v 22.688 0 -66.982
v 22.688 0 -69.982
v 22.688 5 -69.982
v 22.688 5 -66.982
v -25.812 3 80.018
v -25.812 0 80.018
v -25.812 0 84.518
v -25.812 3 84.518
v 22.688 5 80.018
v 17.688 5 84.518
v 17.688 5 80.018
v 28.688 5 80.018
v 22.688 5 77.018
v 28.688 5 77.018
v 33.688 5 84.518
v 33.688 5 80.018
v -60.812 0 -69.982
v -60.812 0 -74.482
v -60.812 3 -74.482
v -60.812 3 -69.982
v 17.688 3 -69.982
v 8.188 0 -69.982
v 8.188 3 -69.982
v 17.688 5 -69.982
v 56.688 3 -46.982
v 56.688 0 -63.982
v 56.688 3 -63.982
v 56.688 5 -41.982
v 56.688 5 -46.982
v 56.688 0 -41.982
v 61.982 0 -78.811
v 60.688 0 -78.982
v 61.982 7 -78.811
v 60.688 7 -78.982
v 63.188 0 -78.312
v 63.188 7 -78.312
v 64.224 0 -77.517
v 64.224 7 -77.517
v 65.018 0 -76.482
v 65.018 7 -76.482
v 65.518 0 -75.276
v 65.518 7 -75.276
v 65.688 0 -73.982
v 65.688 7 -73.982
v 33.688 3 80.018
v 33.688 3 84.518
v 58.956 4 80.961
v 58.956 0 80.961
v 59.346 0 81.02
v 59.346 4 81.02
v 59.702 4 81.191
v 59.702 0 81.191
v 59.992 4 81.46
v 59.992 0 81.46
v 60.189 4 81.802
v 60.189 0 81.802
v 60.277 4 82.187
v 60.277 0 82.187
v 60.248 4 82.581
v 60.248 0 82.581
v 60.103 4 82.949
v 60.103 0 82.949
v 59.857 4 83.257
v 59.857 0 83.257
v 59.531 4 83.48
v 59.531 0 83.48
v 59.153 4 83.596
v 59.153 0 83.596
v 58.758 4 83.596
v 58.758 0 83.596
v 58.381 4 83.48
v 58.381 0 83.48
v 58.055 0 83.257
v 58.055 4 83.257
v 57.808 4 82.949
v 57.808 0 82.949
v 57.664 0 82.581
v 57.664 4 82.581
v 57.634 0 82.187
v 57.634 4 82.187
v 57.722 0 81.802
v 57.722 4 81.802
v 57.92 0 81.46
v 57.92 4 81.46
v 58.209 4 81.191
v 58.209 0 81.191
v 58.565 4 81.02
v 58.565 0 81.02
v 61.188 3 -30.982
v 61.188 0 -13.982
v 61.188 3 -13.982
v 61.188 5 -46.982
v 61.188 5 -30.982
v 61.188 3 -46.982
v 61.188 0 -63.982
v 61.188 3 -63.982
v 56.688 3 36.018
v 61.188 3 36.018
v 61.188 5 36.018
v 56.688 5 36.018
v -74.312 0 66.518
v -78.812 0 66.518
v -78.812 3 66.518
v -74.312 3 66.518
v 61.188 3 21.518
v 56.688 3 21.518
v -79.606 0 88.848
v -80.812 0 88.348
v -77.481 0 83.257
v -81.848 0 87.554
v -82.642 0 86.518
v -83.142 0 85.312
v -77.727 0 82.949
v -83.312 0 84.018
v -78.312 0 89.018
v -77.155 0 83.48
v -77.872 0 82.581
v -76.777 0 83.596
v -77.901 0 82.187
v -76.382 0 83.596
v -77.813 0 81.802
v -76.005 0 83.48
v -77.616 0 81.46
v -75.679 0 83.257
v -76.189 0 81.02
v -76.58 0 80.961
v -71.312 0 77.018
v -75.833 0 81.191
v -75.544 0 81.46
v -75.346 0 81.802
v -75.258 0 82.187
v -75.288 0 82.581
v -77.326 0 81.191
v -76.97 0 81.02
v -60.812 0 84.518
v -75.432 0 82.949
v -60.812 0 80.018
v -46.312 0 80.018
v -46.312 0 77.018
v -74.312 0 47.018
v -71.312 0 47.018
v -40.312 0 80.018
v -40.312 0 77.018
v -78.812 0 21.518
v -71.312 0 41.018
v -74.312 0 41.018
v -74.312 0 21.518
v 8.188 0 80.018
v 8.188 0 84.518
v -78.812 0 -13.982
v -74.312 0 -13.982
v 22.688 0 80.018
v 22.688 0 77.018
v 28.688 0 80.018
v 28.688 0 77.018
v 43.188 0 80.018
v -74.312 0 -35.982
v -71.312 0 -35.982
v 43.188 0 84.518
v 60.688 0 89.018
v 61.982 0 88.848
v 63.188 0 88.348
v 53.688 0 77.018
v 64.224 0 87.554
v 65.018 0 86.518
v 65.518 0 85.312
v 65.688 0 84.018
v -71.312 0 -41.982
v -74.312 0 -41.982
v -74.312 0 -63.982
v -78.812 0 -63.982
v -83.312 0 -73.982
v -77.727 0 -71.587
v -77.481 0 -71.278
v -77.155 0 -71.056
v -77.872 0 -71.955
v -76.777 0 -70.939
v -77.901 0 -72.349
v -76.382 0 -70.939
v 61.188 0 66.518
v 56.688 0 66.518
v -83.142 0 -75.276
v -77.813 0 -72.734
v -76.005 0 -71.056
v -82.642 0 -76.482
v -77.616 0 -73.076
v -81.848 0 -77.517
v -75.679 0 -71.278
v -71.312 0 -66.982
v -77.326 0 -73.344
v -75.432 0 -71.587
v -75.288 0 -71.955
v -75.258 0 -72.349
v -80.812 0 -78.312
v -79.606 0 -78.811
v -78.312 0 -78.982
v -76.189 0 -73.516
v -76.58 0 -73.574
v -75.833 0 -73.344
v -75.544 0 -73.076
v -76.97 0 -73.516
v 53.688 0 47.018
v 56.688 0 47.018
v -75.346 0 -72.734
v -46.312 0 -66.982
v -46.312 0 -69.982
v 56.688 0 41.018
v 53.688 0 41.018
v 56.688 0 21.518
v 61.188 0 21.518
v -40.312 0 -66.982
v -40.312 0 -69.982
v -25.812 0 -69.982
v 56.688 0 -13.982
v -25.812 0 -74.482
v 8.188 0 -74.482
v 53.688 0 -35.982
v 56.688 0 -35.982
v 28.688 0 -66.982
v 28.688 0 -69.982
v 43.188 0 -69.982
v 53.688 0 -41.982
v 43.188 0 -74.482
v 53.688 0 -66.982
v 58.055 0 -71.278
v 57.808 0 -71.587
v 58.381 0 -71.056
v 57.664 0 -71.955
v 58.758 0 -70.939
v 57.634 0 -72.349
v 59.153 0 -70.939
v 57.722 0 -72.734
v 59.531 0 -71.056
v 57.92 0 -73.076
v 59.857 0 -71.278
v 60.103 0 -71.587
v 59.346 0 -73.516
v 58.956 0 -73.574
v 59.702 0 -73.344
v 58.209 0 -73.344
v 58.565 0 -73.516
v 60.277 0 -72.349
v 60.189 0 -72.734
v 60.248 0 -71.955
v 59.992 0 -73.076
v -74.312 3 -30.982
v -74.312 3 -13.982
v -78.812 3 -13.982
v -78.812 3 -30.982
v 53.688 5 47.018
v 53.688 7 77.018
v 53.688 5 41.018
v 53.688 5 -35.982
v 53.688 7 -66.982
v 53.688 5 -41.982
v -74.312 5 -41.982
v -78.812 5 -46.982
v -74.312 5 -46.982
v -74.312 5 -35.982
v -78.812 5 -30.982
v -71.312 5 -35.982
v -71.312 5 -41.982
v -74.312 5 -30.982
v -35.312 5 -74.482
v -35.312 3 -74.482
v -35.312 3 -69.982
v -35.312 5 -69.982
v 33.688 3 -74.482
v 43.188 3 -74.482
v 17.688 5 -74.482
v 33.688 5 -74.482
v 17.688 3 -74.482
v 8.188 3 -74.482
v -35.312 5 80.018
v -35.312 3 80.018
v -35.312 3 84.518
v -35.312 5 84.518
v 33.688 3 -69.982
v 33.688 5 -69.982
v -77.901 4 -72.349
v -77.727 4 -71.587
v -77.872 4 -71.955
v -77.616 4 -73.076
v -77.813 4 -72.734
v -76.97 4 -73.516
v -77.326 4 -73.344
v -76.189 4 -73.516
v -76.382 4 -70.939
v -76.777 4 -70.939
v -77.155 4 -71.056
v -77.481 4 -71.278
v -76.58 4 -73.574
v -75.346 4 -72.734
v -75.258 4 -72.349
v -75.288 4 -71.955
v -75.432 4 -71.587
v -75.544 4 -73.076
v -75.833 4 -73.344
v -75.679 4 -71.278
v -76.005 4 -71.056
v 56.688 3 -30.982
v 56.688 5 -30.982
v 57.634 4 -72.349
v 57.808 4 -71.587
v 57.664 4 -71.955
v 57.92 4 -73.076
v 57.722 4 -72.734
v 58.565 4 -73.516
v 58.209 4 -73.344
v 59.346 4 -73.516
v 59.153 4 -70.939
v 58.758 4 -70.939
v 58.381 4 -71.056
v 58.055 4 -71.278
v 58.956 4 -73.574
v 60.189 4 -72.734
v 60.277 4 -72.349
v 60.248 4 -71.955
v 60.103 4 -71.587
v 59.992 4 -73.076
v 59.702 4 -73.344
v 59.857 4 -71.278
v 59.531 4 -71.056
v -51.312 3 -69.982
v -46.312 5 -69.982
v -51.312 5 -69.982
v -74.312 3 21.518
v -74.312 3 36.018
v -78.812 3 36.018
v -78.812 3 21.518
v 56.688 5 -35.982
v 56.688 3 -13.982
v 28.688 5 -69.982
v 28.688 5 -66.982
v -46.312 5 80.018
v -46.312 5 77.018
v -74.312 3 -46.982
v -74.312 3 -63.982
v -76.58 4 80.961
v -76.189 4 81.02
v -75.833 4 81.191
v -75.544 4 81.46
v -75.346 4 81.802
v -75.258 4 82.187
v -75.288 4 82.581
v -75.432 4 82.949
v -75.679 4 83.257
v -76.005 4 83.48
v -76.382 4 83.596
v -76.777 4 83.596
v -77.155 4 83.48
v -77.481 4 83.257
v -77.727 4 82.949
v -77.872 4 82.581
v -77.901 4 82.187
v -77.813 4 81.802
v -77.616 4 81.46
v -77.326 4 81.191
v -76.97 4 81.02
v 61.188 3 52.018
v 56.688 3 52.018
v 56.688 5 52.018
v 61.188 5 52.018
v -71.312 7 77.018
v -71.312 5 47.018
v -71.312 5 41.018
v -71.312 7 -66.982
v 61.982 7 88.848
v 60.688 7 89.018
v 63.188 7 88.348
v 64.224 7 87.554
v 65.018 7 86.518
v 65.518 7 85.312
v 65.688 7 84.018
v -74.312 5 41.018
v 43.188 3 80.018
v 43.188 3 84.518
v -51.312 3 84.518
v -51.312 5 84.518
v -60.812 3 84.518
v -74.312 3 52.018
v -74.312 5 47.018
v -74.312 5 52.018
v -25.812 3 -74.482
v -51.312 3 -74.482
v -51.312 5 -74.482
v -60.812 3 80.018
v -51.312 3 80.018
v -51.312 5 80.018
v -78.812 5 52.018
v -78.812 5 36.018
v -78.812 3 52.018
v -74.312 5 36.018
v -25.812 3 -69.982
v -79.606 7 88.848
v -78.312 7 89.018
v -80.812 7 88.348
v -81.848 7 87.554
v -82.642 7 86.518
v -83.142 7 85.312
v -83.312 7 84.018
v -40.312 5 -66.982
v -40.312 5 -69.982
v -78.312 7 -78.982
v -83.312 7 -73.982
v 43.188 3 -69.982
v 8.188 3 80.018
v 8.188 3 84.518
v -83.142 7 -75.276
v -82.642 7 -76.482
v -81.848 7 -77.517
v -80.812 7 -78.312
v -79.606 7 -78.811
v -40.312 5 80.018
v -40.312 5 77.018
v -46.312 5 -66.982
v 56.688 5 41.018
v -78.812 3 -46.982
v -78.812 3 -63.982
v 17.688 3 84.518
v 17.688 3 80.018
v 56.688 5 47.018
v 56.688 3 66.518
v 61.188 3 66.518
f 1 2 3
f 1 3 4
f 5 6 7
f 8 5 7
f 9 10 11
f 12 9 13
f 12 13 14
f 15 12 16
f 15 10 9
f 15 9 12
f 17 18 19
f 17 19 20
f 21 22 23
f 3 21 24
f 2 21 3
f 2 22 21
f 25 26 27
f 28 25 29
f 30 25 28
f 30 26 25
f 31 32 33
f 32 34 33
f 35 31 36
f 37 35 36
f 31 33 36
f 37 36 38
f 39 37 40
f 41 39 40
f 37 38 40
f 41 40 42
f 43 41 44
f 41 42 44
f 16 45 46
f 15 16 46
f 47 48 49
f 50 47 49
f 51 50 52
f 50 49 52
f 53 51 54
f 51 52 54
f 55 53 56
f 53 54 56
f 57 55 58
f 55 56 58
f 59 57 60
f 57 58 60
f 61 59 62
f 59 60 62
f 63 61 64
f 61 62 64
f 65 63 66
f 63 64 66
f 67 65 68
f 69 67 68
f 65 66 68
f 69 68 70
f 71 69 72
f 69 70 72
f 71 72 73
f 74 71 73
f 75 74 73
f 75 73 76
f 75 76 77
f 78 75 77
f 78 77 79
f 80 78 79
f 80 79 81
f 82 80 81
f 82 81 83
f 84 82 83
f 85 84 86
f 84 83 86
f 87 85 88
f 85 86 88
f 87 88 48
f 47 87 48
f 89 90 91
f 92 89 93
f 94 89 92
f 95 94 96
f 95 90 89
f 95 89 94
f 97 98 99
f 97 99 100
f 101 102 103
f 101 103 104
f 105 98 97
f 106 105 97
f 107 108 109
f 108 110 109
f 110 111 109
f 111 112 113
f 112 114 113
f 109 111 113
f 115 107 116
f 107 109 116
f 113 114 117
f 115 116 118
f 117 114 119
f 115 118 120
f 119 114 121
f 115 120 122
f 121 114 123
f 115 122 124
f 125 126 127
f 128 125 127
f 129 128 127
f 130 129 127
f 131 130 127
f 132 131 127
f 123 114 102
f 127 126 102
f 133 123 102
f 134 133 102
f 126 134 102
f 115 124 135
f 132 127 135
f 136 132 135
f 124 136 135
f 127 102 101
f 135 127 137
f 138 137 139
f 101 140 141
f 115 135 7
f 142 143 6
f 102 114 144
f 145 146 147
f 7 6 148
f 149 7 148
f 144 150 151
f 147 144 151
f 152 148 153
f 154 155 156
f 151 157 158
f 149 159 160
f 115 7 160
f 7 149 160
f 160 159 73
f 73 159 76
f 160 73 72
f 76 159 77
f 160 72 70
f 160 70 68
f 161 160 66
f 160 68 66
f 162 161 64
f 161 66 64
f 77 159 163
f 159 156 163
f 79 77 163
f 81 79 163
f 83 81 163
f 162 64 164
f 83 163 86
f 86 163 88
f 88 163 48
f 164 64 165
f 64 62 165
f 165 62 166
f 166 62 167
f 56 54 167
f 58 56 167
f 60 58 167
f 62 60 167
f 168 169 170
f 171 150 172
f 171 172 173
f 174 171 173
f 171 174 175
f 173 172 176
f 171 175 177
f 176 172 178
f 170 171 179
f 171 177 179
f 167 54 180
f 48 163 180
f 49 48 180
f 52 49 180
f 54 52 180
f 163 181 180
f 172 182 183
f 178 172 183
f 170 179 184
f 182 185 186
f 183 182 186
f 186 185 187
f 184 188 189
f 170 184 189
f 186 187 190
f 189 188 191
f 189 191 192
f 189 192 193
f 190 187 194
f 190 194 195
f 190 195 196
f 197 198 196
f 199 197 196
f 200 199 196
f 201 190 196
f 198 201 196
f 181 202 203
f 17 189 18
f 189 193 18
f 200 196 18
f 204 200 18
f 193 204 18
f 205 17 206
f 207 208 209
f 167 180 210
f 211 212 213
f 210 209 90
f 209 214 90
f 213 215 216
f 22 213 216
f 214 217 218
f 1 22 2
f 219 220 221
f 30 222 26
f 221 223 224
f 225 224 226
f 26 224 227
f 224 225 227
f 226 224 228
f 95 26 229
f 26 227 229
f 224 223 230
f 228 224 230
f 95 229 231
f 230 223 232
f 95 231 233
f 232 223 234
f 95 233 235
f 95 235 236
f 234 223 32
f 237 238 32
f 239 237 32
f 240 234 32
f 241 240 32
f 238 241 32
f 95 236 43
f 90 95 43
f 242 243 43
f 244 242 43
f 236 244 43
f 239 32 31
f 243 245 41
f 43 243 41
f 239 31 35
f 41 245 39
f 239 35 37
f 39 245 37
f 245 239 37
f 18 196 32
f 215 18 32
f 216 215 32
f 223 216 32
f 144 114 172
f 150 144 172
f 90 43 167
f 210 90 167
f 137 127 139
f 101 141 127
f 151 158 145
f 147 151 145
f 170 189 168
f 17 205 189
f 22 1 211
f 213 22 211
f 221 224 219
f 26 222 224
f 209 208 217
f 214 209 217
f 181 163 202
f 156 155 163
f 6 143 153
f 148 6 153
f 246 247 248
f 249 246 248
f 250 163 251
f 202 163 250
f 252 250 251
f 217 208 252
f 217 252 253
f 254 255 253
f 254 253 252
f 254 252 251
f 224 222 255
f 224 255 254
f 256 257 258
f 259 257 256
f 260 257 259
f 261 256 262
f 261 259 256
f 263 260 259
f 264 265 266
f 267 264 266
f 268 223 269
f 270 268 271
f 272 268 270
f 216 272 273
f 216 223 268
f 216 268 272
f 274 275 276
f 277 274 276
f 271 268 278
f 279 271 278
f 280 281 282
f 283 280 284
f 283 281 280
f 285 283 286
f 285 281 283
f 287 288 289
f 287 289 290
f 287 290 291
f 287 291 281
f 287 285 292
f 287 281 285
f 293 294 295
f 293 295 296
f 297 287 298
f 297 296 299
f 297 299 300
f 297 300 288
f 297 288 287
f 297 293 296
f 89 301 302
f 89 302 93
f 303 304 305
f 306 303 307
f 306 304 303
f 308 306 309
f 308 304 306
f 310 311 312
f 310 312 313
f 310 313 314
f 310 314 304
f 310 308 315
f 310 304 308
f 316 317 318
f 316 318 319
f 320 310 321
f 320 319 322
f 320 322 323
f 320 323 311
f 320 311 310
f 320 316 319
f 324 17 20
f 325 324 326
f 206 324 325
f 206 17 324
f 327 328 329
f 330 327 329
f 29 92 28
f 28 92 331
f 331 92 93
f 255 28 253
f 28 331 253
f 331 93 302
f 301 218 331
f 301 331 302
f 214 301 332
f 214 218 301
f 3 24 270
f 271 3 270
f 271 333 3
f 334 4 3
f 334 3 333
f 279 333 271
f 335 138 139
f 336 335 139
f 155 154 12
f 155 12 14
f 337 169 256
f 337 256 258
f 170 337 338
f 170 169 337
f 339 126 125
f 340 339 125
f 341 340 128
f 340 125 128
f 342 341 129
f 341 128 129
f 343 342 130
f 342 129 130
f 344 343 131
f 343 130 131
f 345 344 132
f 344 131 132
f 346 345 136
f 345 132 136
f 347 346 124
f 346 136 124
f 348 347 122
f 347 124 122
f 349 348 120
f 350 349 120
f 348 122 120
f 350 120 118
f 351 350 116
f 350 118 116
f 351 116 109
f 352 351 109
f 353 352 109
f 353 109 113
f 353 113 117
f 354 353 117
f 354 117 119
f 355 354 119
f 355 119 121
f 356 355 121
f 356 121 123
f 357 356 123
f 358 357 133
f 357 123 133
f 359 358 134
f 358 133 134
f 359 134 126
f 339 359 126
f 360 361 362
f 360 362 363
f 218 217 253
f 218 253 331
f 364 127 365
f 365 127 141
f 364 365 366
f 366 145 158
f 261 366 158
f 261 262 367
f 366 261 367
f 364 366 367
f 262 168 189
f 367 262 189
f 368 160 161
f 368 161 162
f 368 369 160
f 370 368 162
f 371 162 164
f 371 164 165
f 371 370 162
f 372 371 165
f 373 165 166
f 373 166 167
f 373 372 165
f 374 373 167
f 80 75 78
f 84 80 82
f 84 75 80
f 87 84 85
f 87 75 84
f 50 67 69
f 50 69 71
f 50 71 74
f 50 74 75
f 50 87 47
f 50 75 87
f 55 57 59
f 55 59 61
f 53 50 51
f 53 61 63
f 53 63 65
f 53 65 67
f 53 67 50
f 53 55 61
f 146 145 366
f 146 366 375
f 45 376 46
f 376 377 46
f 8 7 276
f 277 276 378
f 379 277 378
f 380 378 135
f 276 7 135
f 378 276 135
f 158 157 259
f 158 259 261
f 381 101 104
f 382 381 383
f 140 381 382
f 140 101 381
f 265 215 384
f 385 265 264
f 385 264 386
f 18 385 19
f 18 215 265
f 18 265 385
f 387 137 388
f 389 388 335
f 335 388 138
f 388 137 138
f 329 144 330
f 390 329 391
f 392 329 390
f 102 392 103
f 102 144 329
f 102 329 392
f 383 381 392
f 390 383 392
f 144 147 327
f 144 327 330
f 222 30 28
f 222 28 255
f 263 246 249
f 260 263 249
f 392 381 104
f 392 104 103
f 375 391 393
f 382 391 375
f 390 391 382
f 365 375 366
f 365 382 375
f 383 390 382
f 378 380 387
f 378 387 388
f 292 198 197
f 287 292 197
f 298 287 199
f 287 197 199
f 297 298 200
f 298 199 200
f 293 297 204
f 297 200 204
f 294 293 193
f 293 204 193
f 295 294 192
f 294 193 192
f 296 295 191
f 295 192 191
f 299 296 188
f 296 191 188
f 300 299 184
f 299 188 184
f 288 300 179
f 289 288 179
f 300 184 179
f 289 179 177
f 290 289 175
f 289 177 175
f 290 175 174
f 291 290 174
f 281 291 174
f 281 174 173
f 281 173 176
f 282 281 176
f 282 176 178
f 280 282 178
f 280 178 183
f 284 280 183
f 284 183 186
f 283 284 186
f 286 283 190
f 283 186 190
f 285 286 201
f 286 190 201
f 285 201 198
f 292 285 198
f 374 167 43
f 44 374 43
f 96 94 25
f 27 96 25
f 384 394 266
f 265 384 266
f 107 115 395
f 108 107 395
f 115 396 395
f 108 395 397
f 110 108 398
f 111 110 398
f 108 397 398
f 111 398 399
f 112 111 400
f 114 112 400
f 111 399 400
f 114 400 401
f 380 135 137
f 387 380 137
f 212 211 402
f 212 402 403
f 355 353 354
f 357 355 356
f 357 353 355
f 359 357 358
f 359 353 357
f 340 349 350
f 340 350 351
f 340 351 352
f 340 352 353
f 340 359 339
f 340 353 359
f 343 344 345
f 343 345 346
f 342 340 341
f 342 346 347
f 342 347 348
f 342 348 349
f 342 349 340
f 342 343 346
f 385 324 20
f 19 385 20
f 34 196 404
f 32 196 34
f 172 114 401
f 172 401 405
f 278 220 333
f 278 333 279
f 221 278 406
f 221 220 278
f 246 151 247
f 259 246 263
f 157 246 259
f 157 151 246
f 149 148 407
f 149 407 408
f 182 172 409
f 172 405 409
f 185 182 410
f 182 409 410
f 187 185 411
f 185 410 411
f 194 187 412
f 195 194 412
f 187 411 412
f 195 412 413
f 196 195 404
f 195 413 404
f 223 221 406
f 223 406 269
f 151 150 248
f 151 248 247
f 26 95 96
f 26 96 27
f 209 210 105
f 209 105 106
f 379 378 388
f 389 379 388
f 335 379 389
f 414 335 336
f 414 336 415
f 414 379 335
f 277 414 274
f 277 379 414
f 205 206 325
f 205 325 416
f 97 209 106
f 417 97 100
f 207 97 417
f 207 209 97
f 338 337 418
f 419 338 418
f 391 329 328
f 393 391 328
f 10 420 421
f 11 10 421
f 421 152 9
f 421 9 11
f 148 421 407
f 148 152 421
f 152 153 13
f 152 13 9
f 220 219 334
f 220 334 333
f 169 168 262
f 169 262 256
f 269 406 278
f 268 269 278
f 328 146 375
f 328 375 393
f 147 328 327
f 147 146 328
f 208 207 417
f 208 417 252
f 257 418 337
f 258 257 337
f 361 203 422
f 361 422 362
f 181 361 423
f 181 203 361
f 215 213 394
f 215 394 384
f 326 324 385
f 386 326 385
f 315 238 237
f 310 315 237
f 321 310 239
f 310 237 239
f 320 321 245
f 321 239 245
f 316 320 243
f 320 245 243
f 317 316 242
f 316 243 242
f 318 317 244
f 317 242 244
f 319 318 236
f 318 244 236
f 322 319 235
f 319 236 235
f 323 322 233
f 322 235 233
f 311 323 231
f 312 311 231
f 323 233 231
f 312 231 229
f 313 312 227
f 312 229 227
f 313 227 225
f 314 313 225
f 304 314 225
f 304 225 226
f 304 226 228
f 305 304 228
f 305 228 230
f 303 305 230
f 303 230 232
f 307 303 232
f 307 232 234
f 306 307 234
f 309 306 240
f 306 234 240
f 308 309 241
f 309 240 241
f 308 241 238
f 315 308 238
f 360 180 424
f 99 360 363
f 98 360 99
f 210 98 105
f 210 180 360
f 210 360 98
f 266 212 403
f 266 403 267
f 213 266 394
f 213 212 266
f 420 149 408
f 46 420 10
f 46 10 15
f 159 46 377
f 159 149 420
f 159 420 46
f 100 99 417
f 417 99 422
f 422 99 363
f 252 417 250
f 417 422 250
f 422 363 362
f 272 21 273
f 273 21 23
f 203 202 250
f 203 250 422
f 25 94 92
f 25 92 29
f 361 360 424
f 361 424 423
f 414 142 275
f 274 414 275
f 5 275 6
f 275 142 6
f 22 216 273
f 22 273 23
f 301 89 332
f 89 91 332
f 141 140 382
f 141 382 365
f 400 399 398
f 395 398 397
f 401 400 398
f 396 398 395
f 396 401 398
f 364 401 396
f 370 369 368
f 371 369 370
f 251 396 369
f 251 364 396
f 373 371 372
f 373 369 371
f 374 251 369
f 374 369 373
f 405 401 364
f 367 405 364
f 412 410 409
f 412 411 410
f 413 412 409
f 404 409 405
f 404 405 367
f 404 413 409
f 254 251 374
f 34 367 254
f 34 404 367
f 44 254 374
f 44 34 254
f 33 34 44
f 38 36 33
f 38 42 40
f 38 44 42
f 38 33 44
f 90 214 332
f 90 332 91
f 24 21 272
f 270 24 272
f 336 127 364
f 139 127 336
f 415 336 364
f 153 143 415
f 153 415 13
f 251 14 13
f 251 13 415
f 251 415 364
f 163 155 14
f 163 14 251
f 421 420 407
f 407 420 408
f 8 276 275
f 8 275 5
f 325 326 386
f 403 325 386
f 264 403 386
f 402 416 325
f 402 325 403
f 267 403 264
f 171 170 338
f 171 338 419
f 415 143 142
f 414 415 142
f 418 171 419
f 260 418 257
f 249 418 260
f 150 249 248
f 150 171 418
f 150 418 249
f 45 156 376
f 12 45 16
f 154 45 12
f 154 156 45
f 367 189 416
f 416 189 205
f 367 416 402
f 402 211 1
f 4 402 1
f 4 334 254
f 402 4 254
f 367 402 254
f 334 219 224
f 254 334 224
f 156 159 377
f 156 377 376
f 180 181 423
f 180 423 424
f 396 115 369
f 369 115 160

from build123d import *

# Parameters (mm, degrees)
SKETCH1_W           = 149
SKETCH1_H           = 168
SKETCH1_W_2         = 125
SKETCH1_H_2         = 144
BOSS_EXTRUDE1_DEPTH = 7
FILLET1_R           = 5
FILLET2_R           = 5
FILLET3_R           = 5
FILLET4_R           = 5
CUT_EXTRUDE1_DEPTH  = 3
SKETCH6_R           = 1.325
CUT_EXTRUDE2_DEPTH  = 4
CUT_EXTRUDE3_DEPTH  = 2


with BuildPart() as part:
    # Sketch1 → Boss-Extrude1 (new body)
    with BuildSketch(Plane(origin=(0, 0, 0), x_dir=(1, 0, 0), z_dir=(0, 1, 0))):
        with Locations((-8.812010444, -5.018276762)):
            Rectangle(SKETCH1_W, SKETCH1_H)
        with Locations((-8.812010444, -5.018276762)):
            Rectangle(SKETCH1_W_2, SKETCH1_H_2, mode=Mode.SUBTRACT)
    extrude(amount=BOSS_EXTRUDE1_DEPTH)

    # Fillet1
    fillet1_edges = [part.edges().sort_by_distance(p)[0] for p in [
        (65.687989556, 3.5, 89.018276762),
    ]]
    fillet(fillet1_edges, radius=FILLET1_R)

    # Fillet2
    fillet2_edges = [part.edges().sort_by_distance(p)[0] for p in [
        (-83.312010444, 3.5, 89.018276762),
    ]]
    fillet(fillet2_edges, radius=FILLET2_R)

    # Fillet3
    fillet3_edges = [part.edges().sort_by_distance(p)[0] for p in [
        (-83.312010444, 3.5, -78.981723238),
    ]]
    fillet(fillet3_edges, radius=FILLET3_R)

    # Fillet4
    fillet4_edges = [part.edges().sort_by_distance(p)[0] for p in [
        (65.687989556, 3.5, -78.981723238),
    ]]
    fillet(fillet4_edges, radius=FILLET4_R)

    # Sketch4 → Cut-Extrude1 (cut)
    with BuildSketch(Plane.XZ):
        Polygon((-40.312010444, 80.018276762), (-25.812010444, 80.018276762), (-25.812010444, 84.518276762), (-60.812010444, 84.518276762), (-60.812010444, 80.018276762), (-46.312010444, 80.018276762), (-46.312010444, 77.018276762), (-40.312010444, 77.018276762), align=None)
        Polygon((22.687989556, 77.018276762), (22.687989556, 80.018276762), (8.187989556, 80.018276762), (8.187989556, 84.518276762), (43.187989556, 84.518276762), (43.187989556, 80.018276762), (28.687989556, 80.018276762), (28.687989556, 77.018276762), align=None)
        Polygon((53.687989556, 47.018276762), (56.687989556, 47.018276762), (56.687989556, 66.518276762), (61.187989556, 66.518276762), (61.187989556, 21.518276762), (56.687989556, 21.518276762), (56.687989556, 41.018276762), (53.687989556, 41.018276762), align=None)
        Polygon((53.687989556, -35.981723238), (56.687989556, -35.981723238), (56.687989556, -13.981723238), (61.187989556, -13.981723238), (61.187989556, -63.981723238), (56.687989556, -63.981723238), (56.687989556, -41.981723238), (53.687989556, -41.981723238), align=None)
        Polygon((43.187989556, -69.981723238), (43.187989556, -74.481723238), (8.187989556, -74.481723238), (8.187989556, -69.981723238), (22.687989556, -69.981723238), (22.687989556, -66.981723238), (28.687989556, -66.981723238), (28.687989556, -69.981723238), align=None)
        Polygon((-40.312010444, -66.981723238), (-40.312010444, -69.981723238), (-25.812010444, -69.981723238), (-25.812010444, -74.481723238), (-60.812010444, -74.481723238), (-60.812010444, -69.981723238), (-46.312010444, -69.981723238), (-46.312010444, -66.981723238), align=None)
        Polygon((-71.312010444, -41.981723238), (-74.312010444, -41.981723238), (-74.312010444, -63.981723238), (-78.812010444, -63.981723238), (-78.812010444, -13.981723238), (-74.312010444, -13.981723238), (-74.312010444, -35.981723238), (-71.312010444, -35.981723238), align=None)
        Polygon((-71.312010444, 41.018276762), (-74.312010444, 41.018276762), (-74.312010444, 21.518276762), (-78.812010444, 21.518276762), (-78.812010444, 66.518276762), (-74.312010444, 66.518276762), (-74.312010444, 47.018276762), (-71.312010444, 47.018276762), align=None)
    extrude(amount=-CUT_EXTRUDE1_DEPTH, mode=Mode.SUBTRACT)

    # Sketch6 → Cut-Extrude2 (cut)
    with BuildSketch(Plane.XZ):
        with Locations(Location((-76.579777397, 82.286043715, 0), (0, 0, 270))):
            Circle(SKETCH6_R)
        with Locations(Location((58.955756509, 82.286043715, 0), (0, 0, 270))):
            Circle(SKETCH6_R)
        with Locations(Location((58.955756509, -72.249490191, 0), (0, 0, 270))):
            Circle(SKETCH6_R)
        with Locations(Location((-76.579777397, -72.249490191, 0), (0, 0, 270))):
            Circle(SKETCH6_R)
    extrude(amount=-CUT_EXTRUDE2_DEPTH, mode=Mode.SUBTRACT)

    # Sketch7 → Cut-Extrude3 (cut)
    with BuildSketch(Plane.XZ.offset(-3)):
        Polygon((53.687989556, -35.981723238), (56.687989556, -35.981723238), (56.687989556, -30.981723238), (61.187989556, -30.981723238), (61.187989556, -46.981723238), (56.687989556, -46.981723238), (56.687989556, -41.981723238), (53.687989556, -41.981723238), align=None)
        Polygon((53.687989556, 47.018276762), (56.687989556, 47.018276762), (56.687989556, 52.018276762), (61.187989556, 52.018276762), (61.187989556, 36.018276762), (56.687989556, 36.018276762), (56.687989556, 41.018276762), (53.687989556, 41.018276762), align=None)
        Polygon((28.687989556, 77.018276762), (28.687989556, 80.018276762), (33.687989556, 80.018276762), (33.687989556, 84.518276762), (17.687989556, 84.518276762), (17.687989556, 80.018276762), (22.687989556, 80.018276762), (22.687989556, 77.018276762), align=None)
        Polygon((-40.312010444, 77.018276762), (-40.312010444, 80.018276762), (-35.312010444, 80.018276762), (-35.312010444, 84.518276762), (-51.312010444, 84.518276762), (-51.312010444, 80.018276762), (-46.312010444, 80.018276762), (-46.312010444, 77.018276762), align=None)
        Polygon((-71.312010444, 47.018276762), (-74.312010444, 47.018276762), (-74.312010444, 52.018276762), (-78.812010444, 52.018276762), (-78.812010444, 36.018276762), (-74.312010444, 36.018276762), (-74.312010444, 41.018276762), (-71.312010444, 41.018276762), align=None)
        Polygon((-71.312010444, -35.981723238), (-74.312010444, -35.981723238), (-74.312010444, -30.981723238), (-78.812010444, -30.981723238), (-78.812010444, -46.981723238), (-74.312010444, -46.981723238), (-74.312010444, -41.981723238), (-71.312010444, -41.981723238), align=None)
        Polygon((-46.312010444, -66.981723238), (-46.312010444, -69.981723238), (-51.312010444, -69.981723238), (-51.312010444, -74.481723238), (-35.312010444, -74.481723238), (-35.312010444, -69.981723238), (-40.312010444, -69.981723238), (-40.312010444, -66.981723238), align=None)
        Polygon((22.687989556, -66.981723238), (22.687989556, -69.981723238), (17.687989556, -69.981723238), (17.687989556, -74.481723238), (33.687989556, -74.481723238), (33.687989556, -69.981723238), (28.687989556, -69.981723238), (28.687989556, -66.981723238), align=None)
    extrude(amount=-CUT_EXTRUDE3_DEPTH, mode=Mode.SUBTRACT)


solid = part.part
